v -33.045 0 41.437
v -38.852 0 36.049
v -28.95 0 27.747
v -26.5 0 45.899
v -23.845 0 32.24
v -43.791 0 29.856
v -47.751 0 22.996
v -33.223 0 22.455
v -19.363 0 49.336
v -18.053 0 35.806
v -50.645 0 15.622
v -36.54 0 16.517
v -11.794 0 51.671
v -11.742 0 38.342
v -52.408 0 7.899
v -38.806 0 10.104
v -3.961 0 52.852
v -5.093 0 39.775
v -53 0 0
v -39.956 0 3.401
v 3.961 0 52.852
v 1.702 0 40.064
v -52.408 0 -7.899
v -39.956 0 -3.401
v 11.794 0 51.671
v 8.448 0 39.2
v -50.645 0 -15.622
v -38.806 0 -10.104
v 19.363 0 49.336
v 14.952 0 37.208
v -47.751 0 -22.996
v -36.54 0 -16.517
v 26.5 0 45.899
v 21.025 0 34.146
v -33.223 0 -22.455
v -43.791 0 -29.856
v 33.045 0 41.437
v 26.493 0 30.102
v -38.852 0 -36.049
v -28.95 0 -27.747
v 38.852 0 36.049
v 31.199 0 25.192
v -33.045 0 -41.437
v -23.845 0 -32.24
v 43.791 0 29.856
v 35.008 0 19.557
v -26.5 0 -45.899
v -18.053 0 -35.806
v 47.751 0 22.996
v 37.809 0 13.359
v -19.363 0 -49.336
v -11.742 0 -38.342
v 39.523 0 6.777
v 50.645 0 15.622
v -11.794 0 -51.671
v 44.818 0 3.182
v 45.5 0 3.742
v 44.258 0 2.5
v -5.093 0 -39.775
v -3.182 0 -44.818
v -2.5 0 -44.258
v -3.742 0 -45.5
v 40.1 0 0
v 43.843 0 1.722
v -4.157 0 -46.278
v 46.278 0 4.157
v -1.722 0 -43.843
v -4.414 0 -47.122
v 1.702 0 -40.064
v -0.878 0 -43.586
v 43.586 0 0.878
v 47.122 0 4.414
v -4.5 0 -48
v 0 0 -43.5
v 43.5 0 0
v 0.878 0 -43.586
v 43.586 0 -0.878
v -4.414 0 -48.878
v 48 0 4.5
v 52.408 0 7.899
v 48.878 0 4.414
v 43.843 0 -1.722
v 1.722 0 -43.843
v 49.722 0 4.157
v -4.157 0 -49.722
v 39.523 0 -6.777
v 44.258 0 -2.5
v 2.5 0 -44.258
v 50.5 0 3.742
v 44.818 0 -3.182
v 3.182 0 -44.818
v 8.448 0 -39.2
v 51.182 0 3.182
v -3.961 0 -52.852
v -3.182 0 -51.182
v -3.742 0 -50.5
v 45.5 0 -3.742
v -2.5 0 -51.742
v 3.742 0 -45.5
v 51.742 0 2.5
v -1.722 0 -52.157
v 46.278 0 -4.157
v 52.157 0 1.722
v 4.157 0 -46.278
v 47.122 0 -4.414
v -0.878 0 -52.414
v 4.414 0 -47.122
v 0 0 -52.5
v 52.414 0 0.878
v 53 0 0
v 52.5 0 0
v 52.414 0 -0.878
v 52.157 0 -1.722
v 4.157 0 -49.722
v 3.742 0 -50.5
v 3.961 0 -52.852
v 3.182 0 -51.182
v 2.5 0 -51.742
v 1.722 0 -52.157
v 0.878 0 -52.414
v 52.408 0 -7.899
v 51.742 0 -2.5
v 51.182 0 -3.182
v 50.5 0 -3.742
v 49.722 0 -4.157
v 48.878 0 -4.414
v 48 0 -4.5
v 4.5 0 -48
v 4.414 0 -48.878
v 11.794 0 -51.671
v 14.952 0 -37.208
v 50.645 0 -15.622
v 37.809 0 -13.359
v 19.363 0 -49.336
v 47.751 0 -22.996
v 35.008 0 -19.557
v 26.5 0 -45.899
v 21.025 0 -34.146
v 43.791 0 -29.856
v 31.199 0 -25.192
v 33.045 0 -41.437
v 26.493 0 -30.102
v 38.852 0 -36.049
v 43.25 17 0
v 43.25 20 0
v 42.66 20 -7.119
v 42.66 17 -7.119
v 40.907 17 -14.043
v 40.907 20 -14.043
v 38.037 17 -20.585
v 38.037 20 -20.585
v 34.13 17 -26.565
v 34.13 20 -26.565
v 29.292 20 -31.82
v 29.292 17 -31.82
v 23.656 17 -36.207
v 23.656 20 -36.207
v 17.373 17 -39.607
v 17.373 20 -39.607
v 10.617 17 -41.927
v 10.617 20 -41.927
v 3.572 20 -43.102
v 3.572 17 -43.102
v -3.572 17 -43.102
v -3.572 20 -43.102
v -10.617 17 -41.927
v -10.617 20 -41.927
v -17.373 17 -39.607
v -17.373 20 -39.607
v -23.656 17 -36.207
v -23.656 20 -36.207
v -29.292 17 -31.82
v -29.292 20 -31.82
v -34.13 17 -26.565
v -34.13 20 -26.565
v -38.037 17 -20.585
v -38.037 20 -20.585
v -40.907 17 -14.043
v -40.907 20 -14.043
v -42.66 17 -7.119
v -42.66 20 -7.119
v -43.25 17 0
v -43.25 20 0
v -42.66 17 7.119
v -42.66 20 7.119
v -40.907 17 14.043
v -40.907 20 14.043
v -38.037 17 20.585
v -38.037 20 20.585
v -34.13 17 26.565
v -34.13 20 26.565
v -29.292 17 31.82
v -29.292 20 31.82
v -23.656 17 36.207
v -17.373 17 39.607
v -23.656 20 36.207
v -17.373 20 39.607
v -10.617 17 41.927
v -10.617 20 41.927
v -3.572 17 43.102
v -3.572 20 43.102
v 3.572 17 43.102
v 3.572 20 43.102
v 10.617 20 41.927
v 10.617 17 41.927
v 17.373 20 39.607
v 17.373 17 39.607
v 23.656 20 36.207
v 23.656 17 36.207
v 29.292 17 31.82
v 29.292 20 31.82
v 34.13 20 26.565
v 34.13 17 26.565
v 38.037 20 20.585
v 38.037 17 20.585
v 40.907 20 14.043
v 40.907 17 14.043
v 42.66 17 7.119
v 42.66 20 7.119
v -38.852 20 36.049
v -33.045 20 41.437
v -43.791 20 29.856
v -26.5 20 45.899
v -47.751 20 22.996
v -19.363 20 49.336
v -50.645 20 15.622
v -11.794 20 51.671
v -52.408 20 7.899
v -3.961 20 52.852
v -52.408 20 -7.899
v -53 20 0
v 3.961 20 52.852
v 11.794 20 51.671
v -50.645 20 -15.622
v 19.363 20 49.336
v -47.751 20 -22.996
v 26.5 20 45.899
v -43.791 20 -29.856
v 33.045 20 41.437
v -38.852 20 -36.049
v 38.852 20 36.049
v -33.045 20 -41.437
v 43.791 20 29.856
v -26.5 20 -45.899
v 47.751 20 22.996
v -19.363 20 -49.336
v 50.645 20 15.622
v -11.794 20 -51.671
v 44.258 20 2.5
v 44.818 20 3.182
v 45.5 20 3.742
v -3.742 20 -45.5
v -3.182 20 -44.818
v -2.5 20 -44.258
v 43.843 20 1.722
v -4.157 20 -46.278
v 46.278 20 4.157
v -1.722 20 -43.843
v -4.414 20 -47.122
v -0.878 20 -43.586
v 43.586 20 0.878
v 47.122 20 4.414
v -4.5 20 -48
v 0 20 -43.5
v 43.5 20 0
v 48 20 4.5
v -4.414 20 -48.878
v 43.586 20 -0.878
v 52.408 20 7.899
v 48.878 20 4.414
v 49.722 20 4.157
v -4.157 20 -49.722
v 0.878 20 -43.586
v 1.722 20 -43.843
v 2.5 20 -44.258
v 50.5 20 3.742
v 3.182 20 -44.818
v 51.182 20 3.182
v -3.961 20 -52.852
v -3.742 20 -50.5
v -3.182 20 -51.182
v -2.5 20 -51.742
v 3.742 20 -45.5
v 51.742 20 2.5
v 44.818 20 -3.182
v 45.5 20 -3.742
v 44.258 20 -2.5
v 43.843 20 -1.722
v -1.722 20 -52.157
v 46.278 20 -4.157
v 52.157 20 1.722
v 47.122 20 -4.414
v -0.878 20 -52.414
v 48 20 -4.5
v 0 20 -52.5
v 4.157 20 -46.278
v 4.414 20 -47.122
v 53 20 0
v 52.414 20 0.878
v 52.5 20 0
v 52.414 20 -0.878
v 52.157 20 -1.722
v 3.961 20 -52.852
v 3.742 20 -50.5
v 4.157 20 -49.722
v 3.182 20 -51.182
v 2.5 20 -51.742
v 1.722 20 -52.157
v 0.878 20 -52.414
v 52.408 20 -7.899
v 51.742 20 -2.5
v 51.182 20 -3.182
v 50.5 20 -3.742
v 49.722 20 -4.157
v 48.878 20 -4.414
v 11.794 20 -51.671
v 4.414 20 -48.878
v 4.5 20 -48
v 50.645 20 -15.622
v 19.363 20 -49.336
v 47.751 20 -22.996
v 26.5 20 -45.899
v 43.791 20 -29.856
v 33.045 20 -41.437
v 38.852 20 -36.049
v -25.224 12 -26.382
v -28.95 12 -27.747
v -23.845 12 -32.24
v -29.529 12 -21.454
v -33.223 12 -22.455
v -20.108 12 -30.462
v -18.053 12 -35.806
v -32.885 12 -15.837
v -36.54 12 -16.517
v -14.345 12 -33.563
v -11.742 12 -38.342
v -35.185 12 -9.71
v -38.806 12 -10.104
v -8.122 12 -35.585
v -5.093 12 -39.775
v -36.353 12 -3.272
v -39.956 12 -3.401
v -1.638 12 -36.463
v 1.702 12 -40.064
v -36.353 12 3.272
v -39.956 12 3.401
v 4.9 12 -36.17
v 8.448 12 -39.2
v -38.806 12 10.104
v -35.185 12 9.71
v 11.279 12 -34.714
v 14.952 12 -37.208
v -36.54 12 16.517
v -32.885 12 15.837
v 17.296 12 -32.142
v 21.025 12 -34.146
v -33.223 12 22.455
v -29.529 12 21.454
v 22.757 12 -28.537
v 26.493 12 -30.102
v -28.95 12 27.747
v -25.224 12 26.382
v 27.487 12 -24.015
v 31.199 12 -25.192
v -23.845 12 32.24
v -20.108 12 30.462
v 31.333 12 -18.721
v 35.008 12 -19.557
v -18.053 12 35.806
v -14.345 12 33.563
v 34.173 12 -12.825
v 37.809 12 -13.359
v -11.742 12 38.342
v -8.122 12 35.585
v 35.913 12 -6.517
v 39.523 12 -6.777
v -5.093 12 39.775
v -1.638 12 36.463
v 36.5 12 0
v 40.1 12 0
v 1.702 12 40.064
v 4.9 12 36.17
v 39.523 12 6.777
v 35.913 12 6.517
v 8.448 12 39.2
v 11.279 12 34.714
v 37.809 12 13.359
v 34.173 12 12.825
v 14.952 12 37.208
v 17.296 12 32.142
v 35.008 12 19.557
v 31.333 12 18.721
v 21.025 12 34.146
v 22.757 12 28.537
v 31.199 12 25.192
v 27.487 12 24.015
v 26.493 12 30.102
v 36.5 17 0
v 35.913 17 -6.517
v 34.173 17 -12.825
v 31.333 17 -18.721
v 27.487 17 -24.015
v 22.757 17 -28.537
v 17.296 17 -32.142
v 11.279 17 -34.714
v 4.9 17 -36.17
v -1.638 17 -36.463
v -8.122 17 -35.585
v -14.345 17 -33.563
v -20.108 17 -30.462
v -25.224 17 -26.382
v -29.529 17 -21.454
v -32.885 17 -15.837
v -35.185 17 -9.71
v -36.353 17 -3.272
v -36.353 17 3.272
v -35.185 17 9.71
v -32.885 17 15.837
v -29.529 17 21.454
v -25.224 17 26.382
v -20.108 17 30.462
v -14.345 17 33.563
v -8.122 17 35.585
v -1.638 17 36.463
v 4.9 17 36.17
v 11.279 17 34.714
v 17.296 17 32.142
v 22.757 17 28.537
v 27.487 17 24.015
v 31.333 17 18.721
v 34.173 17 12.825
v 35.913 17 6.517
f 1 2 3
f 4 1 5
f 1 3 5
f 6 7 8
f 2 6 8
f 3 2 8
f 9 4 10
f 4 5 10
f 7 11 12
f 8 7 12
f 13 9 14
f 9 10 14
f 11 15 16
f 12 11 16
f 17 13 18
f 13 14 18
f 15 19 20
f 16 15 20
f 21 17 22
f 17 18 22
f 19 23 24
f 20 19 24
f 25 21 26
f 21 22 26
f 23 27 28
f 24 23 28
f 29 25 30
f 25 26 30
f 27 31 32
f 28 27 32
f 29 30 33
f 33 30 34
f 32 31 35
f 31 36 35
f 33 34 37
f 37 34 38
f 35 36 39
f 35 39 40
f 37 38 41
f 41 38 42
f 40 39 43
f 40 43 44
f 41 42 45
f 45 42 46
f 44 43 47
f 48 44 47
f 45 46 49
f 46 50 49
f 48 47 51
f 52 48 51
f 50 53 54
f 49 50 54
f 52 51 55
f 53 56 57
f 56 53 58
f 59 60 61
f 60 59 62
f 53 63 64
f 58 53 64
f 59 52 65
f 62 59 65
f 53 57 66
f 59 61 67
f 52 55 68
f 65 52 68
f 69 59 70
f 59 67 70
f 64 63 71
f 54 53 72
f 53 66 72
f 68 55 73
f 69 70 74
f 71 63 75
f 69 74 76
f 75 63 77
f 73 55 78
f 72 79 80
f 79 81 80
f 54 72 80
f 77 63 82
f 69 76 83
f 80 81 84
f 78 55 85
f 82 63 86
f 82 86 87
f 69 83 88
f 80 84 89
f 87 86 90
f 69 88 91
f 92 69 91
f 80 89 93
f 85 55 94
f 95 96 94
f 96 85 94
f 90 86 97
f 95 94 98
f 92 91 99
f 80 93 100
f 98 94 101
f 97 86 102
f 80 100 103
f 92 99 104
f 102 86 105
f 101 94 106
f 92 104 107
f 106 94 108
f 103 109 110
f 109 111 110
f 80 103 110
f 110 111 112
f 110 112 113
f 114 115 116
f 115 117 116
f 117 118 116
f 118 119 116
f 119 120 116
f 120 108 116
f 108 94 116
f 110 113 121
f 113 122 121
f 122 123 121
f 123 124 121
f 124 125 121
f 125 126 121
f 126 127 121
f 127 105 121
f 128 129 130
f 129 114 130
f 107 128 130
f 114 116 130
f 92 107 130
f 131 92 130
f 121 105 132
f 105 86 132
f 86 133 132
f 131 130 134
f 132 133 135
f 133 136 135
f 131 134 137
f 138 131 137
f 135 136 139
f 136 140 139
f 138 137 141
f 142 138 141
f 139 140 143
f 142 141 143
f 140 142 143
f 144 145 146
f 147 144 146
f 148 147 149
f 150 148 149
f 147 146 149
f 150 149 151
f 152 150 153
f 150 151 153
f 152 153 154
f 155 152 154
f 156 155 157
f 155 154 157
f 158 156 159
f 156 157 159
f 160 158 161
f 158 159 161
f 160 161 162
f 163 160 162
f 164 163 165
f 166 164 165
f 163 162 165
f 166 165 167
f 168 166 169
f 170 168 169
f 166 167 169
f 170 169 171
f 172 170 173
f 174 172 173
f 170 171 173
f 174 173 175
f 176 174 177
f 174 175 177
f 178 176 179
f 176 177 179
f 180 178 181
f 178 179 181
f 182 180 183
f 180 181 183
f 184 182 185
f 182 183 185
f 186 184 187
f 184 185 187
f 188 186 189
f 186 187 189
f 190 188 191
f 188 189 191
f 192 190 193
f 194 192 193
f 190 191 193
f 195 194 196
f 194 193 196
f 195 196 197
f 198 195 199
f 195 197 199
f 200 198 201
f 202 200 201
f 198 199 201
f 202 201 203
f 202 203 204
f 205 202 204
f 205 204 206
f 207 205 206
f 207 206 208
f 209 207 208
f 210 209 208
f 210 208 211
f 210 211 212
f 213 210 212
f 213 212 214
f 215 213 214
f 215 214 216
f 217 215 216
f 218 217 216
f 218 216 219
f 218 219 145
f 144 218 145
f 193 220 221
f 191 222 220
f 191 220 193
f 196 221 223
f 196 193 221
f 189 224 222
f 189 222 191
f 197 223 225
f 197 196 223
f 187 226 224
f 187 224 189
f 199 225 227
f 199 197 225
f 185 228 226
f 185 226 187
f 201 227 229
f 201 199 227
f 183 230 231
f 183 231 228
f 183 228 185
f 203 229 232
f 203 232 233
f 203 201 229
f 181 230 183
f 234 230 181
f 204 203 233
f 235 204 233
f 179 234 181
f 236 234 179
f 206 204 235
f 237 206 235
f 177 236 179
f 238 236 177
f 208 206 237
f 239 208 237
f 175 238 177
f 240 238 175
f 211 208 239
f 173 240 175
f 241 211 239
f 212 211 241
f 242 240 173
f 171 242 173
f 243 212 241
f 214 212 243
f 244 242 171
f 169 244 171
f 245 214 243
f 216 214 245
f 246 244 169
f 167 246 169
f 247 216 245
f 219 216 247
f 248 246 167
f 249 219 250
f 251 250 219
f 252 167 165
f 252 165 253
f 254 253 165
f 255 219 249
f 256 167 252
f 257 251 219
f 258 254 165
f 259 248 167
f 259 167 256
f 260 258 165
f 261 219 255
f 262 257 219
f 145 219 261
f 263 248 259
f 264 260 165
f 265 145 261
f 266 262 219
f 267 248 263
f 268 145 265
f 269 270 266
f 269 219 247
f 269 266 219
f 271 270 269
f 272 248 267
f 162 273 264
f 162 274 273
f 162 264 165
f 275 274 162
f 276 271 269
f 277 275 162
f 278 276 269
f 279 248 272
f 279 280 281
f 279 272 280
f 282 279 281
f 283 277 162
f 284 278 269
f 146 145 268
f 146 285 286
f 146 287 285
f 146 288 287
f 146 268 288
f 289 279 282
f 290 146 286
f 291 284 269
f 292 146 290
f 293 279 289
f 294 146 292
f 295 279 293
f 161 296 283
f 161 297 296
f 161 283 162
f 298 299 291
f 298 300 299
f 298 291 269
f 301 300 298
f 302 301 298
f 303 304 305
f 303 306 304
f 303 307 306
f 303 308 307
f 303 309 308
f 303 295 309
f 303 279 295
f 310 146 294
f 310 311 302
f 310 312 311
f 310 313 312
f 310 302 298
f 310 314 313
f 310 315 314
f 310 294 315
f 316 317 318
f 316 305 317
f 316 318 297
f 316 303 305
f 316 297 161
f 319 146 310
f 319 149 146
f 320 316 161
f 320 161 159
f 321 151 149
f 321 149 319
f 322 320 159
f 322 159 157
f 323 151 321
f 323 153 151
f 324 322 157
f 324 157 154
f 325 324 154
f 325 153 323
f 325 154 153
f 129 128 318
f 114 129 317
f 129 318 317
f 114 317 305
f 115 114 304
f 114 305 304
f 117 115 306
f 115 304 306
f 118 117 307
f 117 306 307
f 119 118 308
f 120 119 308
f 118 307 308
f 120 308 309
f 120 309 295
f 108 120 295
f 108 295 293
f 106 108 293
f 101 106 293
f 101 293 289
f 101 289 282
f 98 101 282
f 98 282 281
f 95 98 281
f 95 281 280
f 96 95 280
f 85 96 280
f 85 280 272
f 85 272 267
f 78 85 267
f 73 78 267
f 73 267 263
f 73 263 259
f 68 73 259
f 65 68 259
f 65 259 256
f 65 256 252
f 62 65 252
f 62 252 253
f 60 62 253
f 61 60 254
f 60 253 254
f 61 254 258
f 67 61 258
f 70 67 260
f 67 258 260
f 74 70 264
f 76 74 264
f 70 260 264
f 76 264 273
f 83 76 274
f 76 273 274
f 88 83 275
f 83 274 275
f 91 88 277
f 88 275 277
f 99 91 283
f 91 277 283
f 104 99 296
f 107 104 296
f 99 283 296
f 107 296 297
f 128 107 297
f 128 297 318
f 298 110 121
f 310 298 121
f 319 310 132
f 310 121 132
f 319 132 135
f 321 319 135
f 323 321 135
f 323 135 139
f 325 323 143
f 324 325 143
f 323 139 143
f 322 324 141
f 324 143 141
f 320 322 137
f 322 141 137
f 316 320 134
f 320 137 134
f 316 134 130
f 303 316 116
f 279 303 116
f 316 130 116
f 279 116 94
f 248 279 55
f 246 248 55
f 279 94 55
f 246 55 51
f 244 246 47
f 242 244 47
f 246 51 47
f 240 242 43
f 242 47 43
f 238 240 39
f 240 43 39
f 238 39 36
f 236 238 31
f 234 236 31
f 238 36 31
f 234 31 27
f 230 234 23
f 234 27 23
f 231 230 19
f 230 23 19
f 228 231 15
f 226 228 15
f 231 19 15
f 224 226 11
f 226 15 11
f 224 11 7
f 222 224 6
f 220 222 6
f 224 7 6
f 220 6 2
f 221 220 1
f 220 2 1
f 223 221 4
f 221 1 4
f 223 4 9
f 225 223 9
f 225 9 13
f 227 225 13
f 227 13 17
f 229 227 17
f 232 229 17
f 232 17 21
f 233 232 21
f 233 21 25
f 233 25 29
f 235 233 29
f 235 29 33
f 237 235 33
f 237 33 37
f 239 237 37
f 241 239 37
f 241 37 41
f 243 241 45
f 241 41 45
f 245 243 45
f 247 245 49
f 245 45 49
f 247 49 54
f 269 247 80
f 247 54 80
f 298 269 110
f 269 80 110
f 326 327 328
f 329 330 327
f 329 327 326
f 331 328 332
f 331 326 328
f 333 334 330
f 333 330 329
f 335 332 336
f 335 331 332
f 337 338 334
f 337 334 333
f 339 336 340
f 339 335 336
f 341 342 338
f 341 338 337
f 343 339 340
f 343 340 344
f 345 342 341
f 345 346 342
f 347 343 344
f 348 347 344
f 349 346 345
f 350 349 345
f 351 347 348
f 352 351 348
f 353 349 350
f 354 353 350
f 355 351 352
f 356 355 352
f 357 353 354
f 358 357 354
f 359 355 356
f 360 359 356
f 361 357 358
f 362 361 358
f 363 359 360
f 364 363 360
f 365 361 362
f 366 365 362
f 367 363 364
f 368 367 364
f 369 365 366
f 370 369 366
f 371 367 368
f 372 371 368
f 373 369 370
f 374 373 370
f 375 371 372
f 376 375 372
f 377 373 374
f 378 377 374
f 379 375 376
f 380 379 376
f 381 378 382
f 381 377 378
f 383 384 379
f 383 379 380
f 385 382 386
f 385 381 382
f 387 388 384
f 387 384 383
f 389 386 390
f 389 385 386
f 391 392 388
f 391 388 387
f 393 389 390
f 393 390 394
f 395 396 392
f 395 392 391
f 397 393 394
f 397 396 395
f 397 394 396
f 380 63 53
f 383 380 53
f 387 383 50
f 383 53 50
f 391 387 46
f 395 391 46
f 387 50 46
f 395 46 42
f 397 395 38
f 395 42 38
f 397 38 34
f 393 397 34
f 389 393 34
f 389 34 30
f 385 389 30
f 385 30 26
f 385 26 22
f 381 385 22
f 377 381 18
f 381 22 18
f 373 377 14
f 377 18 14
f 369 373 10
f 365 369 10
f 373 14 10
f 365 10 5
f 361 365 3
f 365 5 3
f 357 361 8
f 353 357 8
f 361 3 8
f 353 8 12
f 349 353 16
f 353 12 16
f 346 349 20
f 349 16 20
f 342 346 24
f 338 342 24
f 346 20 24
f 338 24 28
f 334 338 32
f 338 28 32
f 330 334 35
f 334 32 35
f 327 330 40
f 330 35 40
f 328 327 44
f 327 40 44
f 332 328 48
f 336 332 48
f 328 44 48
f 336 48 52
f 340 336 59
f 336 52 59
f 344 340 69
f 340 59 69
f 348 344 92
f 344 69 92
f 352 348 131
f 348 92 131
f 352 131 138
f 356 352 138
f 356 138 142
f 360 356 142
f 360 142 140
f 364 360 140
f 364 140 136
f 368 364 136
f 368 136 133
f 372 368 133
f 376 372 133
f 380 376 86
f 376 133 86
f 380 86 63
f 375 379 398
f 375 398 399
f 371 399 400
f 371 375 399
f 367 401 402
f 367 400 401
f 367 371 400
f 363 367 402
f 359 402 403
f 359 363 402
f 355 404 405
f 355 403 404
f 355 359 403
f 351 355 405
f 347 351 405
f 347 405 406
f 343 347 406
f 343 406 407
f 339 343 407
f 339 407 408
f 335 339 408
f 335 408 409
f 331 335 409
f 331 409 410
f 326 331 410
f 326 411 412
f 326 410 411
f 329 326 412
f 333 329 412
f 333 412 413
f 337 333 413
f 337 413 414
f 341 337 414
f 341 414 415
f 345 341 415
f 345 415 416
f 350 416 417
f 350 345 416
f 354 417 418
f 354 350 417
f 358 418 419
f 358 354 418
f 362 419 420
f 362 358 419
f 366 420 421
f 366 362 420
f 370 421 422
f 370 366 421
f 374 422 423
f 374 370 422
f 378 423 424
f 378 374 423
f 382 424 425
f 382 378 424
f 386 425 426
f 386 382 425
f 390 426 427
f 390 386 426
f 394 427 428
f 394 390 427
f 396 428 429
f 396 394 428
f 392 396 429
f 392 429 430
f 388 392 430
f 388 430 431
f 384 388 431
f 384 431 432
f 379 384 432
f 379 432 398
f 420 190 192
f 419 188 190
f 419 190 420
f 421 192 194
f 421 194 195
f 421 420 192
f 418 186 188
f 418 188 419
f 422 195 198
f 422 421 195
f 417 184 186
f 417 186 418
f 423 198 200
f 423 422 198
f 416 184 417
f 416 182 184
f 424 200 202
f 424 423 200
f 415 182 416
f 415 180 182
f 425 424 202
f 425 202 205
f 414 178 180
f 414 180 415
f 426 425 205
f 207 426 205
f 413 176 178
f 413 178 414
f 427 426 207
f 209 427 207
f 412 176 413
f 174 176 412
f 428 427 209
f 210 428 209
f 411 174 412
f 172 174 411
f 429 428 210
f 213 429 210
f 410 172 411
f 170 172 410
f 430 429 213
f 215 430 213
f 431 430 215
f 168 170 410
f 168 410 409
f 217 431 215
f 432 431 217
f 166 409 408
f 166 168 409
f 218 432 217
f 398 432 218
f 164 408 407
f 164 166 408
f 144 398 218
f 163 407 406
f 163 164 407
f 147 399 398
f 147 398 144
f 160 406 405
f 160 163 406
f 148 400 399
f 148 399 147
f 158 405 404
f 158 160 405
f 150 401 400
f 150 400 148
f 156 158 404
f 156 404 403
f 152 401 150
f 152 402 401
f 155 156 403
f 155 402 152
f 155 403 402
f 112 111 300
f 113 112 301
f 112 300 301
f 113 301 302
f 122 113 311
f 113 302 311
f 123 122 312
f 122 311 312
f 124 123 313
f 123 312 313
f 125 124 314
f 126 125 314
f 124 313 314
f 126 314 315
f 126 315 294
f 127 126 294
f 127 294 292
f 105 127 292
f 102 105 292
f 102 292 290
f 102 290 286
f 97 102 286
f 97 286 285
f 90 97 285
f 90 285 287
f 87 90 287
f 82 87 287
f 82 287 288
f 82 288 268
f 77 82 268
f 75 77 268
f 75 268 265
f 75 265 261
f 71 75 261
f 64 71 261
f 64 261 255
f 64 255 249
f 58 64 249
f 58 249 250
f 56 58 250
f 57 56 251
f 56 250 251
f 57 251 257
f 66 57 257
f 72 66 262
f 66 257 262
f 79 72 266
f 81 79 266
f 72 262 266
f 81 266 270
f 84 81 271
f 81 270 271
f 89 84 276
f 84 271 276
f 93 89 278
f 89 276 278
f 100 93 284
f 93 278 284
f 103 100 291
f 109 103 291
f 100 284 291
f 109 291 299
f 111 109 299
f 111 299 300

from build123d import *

# Parameters (mm, degrees)
SKETCH1_R           = 53
SKETCH1_R_2         = 36.5
BOSS_EXTRUDE1_DEPTH = 20
SKETCH2_R           = 43.25
LED_RING_DEPTH      = 3
SKETCH3_R           = 40.1
SPINDLE_DEPTH       = 12
SKETCH4_R           = 4.5
LASERS_DEPTH        = 21


with BuildPart() as part:
    # Sketch1 → Boss-Extrude1 (new body)
    with BuildSketch(Plane(origin=(0, 0, 0), x_dir=(1, 0, 0), z_dir=(0, 1, 0))):
        Circle(SKETCH1_R)
        Circle(SKETCH1_R_2, mode=Mode.SUBTRACT)
    extrude(amount=BOSS_EXTRUDE1_DEPTH)

    # Sketch2 → LED-ring (cut)
    with BuildSketch(Plane(origin=(0, 20, 0), x_dir=(1, 0, 0), z_dir=(0, 1, 0))):
        Circle(SKETCH2_R)
    extrude(amount=-LED_RING_DEPTH, mode=Mode.SUBTRACT)

    # Sketch3 → spindle (cut)
    with BuildSketch(Plane.XZ):
        Circle(SKETCH3_R)
    extrude(amount=-SPINDLE_DEPTH, mode=Mode.SUBTRACT)

    # Sketch4 → lasers (cut, through all)
    with BuildSketch(Plane(origin=(0, 20, 0), x_dir=(1, 0, 0), z_dir=(0, 1, 0))):
        with Locations((0, 48)):
            Circle(SKETCH4_R)
        with Locations((48, 0)):
            Circle(SKETCH4_R)
    extrude(amount=-LASERS_DEPTH, mode=Mode.SUBTRACT)


solid = part.part
